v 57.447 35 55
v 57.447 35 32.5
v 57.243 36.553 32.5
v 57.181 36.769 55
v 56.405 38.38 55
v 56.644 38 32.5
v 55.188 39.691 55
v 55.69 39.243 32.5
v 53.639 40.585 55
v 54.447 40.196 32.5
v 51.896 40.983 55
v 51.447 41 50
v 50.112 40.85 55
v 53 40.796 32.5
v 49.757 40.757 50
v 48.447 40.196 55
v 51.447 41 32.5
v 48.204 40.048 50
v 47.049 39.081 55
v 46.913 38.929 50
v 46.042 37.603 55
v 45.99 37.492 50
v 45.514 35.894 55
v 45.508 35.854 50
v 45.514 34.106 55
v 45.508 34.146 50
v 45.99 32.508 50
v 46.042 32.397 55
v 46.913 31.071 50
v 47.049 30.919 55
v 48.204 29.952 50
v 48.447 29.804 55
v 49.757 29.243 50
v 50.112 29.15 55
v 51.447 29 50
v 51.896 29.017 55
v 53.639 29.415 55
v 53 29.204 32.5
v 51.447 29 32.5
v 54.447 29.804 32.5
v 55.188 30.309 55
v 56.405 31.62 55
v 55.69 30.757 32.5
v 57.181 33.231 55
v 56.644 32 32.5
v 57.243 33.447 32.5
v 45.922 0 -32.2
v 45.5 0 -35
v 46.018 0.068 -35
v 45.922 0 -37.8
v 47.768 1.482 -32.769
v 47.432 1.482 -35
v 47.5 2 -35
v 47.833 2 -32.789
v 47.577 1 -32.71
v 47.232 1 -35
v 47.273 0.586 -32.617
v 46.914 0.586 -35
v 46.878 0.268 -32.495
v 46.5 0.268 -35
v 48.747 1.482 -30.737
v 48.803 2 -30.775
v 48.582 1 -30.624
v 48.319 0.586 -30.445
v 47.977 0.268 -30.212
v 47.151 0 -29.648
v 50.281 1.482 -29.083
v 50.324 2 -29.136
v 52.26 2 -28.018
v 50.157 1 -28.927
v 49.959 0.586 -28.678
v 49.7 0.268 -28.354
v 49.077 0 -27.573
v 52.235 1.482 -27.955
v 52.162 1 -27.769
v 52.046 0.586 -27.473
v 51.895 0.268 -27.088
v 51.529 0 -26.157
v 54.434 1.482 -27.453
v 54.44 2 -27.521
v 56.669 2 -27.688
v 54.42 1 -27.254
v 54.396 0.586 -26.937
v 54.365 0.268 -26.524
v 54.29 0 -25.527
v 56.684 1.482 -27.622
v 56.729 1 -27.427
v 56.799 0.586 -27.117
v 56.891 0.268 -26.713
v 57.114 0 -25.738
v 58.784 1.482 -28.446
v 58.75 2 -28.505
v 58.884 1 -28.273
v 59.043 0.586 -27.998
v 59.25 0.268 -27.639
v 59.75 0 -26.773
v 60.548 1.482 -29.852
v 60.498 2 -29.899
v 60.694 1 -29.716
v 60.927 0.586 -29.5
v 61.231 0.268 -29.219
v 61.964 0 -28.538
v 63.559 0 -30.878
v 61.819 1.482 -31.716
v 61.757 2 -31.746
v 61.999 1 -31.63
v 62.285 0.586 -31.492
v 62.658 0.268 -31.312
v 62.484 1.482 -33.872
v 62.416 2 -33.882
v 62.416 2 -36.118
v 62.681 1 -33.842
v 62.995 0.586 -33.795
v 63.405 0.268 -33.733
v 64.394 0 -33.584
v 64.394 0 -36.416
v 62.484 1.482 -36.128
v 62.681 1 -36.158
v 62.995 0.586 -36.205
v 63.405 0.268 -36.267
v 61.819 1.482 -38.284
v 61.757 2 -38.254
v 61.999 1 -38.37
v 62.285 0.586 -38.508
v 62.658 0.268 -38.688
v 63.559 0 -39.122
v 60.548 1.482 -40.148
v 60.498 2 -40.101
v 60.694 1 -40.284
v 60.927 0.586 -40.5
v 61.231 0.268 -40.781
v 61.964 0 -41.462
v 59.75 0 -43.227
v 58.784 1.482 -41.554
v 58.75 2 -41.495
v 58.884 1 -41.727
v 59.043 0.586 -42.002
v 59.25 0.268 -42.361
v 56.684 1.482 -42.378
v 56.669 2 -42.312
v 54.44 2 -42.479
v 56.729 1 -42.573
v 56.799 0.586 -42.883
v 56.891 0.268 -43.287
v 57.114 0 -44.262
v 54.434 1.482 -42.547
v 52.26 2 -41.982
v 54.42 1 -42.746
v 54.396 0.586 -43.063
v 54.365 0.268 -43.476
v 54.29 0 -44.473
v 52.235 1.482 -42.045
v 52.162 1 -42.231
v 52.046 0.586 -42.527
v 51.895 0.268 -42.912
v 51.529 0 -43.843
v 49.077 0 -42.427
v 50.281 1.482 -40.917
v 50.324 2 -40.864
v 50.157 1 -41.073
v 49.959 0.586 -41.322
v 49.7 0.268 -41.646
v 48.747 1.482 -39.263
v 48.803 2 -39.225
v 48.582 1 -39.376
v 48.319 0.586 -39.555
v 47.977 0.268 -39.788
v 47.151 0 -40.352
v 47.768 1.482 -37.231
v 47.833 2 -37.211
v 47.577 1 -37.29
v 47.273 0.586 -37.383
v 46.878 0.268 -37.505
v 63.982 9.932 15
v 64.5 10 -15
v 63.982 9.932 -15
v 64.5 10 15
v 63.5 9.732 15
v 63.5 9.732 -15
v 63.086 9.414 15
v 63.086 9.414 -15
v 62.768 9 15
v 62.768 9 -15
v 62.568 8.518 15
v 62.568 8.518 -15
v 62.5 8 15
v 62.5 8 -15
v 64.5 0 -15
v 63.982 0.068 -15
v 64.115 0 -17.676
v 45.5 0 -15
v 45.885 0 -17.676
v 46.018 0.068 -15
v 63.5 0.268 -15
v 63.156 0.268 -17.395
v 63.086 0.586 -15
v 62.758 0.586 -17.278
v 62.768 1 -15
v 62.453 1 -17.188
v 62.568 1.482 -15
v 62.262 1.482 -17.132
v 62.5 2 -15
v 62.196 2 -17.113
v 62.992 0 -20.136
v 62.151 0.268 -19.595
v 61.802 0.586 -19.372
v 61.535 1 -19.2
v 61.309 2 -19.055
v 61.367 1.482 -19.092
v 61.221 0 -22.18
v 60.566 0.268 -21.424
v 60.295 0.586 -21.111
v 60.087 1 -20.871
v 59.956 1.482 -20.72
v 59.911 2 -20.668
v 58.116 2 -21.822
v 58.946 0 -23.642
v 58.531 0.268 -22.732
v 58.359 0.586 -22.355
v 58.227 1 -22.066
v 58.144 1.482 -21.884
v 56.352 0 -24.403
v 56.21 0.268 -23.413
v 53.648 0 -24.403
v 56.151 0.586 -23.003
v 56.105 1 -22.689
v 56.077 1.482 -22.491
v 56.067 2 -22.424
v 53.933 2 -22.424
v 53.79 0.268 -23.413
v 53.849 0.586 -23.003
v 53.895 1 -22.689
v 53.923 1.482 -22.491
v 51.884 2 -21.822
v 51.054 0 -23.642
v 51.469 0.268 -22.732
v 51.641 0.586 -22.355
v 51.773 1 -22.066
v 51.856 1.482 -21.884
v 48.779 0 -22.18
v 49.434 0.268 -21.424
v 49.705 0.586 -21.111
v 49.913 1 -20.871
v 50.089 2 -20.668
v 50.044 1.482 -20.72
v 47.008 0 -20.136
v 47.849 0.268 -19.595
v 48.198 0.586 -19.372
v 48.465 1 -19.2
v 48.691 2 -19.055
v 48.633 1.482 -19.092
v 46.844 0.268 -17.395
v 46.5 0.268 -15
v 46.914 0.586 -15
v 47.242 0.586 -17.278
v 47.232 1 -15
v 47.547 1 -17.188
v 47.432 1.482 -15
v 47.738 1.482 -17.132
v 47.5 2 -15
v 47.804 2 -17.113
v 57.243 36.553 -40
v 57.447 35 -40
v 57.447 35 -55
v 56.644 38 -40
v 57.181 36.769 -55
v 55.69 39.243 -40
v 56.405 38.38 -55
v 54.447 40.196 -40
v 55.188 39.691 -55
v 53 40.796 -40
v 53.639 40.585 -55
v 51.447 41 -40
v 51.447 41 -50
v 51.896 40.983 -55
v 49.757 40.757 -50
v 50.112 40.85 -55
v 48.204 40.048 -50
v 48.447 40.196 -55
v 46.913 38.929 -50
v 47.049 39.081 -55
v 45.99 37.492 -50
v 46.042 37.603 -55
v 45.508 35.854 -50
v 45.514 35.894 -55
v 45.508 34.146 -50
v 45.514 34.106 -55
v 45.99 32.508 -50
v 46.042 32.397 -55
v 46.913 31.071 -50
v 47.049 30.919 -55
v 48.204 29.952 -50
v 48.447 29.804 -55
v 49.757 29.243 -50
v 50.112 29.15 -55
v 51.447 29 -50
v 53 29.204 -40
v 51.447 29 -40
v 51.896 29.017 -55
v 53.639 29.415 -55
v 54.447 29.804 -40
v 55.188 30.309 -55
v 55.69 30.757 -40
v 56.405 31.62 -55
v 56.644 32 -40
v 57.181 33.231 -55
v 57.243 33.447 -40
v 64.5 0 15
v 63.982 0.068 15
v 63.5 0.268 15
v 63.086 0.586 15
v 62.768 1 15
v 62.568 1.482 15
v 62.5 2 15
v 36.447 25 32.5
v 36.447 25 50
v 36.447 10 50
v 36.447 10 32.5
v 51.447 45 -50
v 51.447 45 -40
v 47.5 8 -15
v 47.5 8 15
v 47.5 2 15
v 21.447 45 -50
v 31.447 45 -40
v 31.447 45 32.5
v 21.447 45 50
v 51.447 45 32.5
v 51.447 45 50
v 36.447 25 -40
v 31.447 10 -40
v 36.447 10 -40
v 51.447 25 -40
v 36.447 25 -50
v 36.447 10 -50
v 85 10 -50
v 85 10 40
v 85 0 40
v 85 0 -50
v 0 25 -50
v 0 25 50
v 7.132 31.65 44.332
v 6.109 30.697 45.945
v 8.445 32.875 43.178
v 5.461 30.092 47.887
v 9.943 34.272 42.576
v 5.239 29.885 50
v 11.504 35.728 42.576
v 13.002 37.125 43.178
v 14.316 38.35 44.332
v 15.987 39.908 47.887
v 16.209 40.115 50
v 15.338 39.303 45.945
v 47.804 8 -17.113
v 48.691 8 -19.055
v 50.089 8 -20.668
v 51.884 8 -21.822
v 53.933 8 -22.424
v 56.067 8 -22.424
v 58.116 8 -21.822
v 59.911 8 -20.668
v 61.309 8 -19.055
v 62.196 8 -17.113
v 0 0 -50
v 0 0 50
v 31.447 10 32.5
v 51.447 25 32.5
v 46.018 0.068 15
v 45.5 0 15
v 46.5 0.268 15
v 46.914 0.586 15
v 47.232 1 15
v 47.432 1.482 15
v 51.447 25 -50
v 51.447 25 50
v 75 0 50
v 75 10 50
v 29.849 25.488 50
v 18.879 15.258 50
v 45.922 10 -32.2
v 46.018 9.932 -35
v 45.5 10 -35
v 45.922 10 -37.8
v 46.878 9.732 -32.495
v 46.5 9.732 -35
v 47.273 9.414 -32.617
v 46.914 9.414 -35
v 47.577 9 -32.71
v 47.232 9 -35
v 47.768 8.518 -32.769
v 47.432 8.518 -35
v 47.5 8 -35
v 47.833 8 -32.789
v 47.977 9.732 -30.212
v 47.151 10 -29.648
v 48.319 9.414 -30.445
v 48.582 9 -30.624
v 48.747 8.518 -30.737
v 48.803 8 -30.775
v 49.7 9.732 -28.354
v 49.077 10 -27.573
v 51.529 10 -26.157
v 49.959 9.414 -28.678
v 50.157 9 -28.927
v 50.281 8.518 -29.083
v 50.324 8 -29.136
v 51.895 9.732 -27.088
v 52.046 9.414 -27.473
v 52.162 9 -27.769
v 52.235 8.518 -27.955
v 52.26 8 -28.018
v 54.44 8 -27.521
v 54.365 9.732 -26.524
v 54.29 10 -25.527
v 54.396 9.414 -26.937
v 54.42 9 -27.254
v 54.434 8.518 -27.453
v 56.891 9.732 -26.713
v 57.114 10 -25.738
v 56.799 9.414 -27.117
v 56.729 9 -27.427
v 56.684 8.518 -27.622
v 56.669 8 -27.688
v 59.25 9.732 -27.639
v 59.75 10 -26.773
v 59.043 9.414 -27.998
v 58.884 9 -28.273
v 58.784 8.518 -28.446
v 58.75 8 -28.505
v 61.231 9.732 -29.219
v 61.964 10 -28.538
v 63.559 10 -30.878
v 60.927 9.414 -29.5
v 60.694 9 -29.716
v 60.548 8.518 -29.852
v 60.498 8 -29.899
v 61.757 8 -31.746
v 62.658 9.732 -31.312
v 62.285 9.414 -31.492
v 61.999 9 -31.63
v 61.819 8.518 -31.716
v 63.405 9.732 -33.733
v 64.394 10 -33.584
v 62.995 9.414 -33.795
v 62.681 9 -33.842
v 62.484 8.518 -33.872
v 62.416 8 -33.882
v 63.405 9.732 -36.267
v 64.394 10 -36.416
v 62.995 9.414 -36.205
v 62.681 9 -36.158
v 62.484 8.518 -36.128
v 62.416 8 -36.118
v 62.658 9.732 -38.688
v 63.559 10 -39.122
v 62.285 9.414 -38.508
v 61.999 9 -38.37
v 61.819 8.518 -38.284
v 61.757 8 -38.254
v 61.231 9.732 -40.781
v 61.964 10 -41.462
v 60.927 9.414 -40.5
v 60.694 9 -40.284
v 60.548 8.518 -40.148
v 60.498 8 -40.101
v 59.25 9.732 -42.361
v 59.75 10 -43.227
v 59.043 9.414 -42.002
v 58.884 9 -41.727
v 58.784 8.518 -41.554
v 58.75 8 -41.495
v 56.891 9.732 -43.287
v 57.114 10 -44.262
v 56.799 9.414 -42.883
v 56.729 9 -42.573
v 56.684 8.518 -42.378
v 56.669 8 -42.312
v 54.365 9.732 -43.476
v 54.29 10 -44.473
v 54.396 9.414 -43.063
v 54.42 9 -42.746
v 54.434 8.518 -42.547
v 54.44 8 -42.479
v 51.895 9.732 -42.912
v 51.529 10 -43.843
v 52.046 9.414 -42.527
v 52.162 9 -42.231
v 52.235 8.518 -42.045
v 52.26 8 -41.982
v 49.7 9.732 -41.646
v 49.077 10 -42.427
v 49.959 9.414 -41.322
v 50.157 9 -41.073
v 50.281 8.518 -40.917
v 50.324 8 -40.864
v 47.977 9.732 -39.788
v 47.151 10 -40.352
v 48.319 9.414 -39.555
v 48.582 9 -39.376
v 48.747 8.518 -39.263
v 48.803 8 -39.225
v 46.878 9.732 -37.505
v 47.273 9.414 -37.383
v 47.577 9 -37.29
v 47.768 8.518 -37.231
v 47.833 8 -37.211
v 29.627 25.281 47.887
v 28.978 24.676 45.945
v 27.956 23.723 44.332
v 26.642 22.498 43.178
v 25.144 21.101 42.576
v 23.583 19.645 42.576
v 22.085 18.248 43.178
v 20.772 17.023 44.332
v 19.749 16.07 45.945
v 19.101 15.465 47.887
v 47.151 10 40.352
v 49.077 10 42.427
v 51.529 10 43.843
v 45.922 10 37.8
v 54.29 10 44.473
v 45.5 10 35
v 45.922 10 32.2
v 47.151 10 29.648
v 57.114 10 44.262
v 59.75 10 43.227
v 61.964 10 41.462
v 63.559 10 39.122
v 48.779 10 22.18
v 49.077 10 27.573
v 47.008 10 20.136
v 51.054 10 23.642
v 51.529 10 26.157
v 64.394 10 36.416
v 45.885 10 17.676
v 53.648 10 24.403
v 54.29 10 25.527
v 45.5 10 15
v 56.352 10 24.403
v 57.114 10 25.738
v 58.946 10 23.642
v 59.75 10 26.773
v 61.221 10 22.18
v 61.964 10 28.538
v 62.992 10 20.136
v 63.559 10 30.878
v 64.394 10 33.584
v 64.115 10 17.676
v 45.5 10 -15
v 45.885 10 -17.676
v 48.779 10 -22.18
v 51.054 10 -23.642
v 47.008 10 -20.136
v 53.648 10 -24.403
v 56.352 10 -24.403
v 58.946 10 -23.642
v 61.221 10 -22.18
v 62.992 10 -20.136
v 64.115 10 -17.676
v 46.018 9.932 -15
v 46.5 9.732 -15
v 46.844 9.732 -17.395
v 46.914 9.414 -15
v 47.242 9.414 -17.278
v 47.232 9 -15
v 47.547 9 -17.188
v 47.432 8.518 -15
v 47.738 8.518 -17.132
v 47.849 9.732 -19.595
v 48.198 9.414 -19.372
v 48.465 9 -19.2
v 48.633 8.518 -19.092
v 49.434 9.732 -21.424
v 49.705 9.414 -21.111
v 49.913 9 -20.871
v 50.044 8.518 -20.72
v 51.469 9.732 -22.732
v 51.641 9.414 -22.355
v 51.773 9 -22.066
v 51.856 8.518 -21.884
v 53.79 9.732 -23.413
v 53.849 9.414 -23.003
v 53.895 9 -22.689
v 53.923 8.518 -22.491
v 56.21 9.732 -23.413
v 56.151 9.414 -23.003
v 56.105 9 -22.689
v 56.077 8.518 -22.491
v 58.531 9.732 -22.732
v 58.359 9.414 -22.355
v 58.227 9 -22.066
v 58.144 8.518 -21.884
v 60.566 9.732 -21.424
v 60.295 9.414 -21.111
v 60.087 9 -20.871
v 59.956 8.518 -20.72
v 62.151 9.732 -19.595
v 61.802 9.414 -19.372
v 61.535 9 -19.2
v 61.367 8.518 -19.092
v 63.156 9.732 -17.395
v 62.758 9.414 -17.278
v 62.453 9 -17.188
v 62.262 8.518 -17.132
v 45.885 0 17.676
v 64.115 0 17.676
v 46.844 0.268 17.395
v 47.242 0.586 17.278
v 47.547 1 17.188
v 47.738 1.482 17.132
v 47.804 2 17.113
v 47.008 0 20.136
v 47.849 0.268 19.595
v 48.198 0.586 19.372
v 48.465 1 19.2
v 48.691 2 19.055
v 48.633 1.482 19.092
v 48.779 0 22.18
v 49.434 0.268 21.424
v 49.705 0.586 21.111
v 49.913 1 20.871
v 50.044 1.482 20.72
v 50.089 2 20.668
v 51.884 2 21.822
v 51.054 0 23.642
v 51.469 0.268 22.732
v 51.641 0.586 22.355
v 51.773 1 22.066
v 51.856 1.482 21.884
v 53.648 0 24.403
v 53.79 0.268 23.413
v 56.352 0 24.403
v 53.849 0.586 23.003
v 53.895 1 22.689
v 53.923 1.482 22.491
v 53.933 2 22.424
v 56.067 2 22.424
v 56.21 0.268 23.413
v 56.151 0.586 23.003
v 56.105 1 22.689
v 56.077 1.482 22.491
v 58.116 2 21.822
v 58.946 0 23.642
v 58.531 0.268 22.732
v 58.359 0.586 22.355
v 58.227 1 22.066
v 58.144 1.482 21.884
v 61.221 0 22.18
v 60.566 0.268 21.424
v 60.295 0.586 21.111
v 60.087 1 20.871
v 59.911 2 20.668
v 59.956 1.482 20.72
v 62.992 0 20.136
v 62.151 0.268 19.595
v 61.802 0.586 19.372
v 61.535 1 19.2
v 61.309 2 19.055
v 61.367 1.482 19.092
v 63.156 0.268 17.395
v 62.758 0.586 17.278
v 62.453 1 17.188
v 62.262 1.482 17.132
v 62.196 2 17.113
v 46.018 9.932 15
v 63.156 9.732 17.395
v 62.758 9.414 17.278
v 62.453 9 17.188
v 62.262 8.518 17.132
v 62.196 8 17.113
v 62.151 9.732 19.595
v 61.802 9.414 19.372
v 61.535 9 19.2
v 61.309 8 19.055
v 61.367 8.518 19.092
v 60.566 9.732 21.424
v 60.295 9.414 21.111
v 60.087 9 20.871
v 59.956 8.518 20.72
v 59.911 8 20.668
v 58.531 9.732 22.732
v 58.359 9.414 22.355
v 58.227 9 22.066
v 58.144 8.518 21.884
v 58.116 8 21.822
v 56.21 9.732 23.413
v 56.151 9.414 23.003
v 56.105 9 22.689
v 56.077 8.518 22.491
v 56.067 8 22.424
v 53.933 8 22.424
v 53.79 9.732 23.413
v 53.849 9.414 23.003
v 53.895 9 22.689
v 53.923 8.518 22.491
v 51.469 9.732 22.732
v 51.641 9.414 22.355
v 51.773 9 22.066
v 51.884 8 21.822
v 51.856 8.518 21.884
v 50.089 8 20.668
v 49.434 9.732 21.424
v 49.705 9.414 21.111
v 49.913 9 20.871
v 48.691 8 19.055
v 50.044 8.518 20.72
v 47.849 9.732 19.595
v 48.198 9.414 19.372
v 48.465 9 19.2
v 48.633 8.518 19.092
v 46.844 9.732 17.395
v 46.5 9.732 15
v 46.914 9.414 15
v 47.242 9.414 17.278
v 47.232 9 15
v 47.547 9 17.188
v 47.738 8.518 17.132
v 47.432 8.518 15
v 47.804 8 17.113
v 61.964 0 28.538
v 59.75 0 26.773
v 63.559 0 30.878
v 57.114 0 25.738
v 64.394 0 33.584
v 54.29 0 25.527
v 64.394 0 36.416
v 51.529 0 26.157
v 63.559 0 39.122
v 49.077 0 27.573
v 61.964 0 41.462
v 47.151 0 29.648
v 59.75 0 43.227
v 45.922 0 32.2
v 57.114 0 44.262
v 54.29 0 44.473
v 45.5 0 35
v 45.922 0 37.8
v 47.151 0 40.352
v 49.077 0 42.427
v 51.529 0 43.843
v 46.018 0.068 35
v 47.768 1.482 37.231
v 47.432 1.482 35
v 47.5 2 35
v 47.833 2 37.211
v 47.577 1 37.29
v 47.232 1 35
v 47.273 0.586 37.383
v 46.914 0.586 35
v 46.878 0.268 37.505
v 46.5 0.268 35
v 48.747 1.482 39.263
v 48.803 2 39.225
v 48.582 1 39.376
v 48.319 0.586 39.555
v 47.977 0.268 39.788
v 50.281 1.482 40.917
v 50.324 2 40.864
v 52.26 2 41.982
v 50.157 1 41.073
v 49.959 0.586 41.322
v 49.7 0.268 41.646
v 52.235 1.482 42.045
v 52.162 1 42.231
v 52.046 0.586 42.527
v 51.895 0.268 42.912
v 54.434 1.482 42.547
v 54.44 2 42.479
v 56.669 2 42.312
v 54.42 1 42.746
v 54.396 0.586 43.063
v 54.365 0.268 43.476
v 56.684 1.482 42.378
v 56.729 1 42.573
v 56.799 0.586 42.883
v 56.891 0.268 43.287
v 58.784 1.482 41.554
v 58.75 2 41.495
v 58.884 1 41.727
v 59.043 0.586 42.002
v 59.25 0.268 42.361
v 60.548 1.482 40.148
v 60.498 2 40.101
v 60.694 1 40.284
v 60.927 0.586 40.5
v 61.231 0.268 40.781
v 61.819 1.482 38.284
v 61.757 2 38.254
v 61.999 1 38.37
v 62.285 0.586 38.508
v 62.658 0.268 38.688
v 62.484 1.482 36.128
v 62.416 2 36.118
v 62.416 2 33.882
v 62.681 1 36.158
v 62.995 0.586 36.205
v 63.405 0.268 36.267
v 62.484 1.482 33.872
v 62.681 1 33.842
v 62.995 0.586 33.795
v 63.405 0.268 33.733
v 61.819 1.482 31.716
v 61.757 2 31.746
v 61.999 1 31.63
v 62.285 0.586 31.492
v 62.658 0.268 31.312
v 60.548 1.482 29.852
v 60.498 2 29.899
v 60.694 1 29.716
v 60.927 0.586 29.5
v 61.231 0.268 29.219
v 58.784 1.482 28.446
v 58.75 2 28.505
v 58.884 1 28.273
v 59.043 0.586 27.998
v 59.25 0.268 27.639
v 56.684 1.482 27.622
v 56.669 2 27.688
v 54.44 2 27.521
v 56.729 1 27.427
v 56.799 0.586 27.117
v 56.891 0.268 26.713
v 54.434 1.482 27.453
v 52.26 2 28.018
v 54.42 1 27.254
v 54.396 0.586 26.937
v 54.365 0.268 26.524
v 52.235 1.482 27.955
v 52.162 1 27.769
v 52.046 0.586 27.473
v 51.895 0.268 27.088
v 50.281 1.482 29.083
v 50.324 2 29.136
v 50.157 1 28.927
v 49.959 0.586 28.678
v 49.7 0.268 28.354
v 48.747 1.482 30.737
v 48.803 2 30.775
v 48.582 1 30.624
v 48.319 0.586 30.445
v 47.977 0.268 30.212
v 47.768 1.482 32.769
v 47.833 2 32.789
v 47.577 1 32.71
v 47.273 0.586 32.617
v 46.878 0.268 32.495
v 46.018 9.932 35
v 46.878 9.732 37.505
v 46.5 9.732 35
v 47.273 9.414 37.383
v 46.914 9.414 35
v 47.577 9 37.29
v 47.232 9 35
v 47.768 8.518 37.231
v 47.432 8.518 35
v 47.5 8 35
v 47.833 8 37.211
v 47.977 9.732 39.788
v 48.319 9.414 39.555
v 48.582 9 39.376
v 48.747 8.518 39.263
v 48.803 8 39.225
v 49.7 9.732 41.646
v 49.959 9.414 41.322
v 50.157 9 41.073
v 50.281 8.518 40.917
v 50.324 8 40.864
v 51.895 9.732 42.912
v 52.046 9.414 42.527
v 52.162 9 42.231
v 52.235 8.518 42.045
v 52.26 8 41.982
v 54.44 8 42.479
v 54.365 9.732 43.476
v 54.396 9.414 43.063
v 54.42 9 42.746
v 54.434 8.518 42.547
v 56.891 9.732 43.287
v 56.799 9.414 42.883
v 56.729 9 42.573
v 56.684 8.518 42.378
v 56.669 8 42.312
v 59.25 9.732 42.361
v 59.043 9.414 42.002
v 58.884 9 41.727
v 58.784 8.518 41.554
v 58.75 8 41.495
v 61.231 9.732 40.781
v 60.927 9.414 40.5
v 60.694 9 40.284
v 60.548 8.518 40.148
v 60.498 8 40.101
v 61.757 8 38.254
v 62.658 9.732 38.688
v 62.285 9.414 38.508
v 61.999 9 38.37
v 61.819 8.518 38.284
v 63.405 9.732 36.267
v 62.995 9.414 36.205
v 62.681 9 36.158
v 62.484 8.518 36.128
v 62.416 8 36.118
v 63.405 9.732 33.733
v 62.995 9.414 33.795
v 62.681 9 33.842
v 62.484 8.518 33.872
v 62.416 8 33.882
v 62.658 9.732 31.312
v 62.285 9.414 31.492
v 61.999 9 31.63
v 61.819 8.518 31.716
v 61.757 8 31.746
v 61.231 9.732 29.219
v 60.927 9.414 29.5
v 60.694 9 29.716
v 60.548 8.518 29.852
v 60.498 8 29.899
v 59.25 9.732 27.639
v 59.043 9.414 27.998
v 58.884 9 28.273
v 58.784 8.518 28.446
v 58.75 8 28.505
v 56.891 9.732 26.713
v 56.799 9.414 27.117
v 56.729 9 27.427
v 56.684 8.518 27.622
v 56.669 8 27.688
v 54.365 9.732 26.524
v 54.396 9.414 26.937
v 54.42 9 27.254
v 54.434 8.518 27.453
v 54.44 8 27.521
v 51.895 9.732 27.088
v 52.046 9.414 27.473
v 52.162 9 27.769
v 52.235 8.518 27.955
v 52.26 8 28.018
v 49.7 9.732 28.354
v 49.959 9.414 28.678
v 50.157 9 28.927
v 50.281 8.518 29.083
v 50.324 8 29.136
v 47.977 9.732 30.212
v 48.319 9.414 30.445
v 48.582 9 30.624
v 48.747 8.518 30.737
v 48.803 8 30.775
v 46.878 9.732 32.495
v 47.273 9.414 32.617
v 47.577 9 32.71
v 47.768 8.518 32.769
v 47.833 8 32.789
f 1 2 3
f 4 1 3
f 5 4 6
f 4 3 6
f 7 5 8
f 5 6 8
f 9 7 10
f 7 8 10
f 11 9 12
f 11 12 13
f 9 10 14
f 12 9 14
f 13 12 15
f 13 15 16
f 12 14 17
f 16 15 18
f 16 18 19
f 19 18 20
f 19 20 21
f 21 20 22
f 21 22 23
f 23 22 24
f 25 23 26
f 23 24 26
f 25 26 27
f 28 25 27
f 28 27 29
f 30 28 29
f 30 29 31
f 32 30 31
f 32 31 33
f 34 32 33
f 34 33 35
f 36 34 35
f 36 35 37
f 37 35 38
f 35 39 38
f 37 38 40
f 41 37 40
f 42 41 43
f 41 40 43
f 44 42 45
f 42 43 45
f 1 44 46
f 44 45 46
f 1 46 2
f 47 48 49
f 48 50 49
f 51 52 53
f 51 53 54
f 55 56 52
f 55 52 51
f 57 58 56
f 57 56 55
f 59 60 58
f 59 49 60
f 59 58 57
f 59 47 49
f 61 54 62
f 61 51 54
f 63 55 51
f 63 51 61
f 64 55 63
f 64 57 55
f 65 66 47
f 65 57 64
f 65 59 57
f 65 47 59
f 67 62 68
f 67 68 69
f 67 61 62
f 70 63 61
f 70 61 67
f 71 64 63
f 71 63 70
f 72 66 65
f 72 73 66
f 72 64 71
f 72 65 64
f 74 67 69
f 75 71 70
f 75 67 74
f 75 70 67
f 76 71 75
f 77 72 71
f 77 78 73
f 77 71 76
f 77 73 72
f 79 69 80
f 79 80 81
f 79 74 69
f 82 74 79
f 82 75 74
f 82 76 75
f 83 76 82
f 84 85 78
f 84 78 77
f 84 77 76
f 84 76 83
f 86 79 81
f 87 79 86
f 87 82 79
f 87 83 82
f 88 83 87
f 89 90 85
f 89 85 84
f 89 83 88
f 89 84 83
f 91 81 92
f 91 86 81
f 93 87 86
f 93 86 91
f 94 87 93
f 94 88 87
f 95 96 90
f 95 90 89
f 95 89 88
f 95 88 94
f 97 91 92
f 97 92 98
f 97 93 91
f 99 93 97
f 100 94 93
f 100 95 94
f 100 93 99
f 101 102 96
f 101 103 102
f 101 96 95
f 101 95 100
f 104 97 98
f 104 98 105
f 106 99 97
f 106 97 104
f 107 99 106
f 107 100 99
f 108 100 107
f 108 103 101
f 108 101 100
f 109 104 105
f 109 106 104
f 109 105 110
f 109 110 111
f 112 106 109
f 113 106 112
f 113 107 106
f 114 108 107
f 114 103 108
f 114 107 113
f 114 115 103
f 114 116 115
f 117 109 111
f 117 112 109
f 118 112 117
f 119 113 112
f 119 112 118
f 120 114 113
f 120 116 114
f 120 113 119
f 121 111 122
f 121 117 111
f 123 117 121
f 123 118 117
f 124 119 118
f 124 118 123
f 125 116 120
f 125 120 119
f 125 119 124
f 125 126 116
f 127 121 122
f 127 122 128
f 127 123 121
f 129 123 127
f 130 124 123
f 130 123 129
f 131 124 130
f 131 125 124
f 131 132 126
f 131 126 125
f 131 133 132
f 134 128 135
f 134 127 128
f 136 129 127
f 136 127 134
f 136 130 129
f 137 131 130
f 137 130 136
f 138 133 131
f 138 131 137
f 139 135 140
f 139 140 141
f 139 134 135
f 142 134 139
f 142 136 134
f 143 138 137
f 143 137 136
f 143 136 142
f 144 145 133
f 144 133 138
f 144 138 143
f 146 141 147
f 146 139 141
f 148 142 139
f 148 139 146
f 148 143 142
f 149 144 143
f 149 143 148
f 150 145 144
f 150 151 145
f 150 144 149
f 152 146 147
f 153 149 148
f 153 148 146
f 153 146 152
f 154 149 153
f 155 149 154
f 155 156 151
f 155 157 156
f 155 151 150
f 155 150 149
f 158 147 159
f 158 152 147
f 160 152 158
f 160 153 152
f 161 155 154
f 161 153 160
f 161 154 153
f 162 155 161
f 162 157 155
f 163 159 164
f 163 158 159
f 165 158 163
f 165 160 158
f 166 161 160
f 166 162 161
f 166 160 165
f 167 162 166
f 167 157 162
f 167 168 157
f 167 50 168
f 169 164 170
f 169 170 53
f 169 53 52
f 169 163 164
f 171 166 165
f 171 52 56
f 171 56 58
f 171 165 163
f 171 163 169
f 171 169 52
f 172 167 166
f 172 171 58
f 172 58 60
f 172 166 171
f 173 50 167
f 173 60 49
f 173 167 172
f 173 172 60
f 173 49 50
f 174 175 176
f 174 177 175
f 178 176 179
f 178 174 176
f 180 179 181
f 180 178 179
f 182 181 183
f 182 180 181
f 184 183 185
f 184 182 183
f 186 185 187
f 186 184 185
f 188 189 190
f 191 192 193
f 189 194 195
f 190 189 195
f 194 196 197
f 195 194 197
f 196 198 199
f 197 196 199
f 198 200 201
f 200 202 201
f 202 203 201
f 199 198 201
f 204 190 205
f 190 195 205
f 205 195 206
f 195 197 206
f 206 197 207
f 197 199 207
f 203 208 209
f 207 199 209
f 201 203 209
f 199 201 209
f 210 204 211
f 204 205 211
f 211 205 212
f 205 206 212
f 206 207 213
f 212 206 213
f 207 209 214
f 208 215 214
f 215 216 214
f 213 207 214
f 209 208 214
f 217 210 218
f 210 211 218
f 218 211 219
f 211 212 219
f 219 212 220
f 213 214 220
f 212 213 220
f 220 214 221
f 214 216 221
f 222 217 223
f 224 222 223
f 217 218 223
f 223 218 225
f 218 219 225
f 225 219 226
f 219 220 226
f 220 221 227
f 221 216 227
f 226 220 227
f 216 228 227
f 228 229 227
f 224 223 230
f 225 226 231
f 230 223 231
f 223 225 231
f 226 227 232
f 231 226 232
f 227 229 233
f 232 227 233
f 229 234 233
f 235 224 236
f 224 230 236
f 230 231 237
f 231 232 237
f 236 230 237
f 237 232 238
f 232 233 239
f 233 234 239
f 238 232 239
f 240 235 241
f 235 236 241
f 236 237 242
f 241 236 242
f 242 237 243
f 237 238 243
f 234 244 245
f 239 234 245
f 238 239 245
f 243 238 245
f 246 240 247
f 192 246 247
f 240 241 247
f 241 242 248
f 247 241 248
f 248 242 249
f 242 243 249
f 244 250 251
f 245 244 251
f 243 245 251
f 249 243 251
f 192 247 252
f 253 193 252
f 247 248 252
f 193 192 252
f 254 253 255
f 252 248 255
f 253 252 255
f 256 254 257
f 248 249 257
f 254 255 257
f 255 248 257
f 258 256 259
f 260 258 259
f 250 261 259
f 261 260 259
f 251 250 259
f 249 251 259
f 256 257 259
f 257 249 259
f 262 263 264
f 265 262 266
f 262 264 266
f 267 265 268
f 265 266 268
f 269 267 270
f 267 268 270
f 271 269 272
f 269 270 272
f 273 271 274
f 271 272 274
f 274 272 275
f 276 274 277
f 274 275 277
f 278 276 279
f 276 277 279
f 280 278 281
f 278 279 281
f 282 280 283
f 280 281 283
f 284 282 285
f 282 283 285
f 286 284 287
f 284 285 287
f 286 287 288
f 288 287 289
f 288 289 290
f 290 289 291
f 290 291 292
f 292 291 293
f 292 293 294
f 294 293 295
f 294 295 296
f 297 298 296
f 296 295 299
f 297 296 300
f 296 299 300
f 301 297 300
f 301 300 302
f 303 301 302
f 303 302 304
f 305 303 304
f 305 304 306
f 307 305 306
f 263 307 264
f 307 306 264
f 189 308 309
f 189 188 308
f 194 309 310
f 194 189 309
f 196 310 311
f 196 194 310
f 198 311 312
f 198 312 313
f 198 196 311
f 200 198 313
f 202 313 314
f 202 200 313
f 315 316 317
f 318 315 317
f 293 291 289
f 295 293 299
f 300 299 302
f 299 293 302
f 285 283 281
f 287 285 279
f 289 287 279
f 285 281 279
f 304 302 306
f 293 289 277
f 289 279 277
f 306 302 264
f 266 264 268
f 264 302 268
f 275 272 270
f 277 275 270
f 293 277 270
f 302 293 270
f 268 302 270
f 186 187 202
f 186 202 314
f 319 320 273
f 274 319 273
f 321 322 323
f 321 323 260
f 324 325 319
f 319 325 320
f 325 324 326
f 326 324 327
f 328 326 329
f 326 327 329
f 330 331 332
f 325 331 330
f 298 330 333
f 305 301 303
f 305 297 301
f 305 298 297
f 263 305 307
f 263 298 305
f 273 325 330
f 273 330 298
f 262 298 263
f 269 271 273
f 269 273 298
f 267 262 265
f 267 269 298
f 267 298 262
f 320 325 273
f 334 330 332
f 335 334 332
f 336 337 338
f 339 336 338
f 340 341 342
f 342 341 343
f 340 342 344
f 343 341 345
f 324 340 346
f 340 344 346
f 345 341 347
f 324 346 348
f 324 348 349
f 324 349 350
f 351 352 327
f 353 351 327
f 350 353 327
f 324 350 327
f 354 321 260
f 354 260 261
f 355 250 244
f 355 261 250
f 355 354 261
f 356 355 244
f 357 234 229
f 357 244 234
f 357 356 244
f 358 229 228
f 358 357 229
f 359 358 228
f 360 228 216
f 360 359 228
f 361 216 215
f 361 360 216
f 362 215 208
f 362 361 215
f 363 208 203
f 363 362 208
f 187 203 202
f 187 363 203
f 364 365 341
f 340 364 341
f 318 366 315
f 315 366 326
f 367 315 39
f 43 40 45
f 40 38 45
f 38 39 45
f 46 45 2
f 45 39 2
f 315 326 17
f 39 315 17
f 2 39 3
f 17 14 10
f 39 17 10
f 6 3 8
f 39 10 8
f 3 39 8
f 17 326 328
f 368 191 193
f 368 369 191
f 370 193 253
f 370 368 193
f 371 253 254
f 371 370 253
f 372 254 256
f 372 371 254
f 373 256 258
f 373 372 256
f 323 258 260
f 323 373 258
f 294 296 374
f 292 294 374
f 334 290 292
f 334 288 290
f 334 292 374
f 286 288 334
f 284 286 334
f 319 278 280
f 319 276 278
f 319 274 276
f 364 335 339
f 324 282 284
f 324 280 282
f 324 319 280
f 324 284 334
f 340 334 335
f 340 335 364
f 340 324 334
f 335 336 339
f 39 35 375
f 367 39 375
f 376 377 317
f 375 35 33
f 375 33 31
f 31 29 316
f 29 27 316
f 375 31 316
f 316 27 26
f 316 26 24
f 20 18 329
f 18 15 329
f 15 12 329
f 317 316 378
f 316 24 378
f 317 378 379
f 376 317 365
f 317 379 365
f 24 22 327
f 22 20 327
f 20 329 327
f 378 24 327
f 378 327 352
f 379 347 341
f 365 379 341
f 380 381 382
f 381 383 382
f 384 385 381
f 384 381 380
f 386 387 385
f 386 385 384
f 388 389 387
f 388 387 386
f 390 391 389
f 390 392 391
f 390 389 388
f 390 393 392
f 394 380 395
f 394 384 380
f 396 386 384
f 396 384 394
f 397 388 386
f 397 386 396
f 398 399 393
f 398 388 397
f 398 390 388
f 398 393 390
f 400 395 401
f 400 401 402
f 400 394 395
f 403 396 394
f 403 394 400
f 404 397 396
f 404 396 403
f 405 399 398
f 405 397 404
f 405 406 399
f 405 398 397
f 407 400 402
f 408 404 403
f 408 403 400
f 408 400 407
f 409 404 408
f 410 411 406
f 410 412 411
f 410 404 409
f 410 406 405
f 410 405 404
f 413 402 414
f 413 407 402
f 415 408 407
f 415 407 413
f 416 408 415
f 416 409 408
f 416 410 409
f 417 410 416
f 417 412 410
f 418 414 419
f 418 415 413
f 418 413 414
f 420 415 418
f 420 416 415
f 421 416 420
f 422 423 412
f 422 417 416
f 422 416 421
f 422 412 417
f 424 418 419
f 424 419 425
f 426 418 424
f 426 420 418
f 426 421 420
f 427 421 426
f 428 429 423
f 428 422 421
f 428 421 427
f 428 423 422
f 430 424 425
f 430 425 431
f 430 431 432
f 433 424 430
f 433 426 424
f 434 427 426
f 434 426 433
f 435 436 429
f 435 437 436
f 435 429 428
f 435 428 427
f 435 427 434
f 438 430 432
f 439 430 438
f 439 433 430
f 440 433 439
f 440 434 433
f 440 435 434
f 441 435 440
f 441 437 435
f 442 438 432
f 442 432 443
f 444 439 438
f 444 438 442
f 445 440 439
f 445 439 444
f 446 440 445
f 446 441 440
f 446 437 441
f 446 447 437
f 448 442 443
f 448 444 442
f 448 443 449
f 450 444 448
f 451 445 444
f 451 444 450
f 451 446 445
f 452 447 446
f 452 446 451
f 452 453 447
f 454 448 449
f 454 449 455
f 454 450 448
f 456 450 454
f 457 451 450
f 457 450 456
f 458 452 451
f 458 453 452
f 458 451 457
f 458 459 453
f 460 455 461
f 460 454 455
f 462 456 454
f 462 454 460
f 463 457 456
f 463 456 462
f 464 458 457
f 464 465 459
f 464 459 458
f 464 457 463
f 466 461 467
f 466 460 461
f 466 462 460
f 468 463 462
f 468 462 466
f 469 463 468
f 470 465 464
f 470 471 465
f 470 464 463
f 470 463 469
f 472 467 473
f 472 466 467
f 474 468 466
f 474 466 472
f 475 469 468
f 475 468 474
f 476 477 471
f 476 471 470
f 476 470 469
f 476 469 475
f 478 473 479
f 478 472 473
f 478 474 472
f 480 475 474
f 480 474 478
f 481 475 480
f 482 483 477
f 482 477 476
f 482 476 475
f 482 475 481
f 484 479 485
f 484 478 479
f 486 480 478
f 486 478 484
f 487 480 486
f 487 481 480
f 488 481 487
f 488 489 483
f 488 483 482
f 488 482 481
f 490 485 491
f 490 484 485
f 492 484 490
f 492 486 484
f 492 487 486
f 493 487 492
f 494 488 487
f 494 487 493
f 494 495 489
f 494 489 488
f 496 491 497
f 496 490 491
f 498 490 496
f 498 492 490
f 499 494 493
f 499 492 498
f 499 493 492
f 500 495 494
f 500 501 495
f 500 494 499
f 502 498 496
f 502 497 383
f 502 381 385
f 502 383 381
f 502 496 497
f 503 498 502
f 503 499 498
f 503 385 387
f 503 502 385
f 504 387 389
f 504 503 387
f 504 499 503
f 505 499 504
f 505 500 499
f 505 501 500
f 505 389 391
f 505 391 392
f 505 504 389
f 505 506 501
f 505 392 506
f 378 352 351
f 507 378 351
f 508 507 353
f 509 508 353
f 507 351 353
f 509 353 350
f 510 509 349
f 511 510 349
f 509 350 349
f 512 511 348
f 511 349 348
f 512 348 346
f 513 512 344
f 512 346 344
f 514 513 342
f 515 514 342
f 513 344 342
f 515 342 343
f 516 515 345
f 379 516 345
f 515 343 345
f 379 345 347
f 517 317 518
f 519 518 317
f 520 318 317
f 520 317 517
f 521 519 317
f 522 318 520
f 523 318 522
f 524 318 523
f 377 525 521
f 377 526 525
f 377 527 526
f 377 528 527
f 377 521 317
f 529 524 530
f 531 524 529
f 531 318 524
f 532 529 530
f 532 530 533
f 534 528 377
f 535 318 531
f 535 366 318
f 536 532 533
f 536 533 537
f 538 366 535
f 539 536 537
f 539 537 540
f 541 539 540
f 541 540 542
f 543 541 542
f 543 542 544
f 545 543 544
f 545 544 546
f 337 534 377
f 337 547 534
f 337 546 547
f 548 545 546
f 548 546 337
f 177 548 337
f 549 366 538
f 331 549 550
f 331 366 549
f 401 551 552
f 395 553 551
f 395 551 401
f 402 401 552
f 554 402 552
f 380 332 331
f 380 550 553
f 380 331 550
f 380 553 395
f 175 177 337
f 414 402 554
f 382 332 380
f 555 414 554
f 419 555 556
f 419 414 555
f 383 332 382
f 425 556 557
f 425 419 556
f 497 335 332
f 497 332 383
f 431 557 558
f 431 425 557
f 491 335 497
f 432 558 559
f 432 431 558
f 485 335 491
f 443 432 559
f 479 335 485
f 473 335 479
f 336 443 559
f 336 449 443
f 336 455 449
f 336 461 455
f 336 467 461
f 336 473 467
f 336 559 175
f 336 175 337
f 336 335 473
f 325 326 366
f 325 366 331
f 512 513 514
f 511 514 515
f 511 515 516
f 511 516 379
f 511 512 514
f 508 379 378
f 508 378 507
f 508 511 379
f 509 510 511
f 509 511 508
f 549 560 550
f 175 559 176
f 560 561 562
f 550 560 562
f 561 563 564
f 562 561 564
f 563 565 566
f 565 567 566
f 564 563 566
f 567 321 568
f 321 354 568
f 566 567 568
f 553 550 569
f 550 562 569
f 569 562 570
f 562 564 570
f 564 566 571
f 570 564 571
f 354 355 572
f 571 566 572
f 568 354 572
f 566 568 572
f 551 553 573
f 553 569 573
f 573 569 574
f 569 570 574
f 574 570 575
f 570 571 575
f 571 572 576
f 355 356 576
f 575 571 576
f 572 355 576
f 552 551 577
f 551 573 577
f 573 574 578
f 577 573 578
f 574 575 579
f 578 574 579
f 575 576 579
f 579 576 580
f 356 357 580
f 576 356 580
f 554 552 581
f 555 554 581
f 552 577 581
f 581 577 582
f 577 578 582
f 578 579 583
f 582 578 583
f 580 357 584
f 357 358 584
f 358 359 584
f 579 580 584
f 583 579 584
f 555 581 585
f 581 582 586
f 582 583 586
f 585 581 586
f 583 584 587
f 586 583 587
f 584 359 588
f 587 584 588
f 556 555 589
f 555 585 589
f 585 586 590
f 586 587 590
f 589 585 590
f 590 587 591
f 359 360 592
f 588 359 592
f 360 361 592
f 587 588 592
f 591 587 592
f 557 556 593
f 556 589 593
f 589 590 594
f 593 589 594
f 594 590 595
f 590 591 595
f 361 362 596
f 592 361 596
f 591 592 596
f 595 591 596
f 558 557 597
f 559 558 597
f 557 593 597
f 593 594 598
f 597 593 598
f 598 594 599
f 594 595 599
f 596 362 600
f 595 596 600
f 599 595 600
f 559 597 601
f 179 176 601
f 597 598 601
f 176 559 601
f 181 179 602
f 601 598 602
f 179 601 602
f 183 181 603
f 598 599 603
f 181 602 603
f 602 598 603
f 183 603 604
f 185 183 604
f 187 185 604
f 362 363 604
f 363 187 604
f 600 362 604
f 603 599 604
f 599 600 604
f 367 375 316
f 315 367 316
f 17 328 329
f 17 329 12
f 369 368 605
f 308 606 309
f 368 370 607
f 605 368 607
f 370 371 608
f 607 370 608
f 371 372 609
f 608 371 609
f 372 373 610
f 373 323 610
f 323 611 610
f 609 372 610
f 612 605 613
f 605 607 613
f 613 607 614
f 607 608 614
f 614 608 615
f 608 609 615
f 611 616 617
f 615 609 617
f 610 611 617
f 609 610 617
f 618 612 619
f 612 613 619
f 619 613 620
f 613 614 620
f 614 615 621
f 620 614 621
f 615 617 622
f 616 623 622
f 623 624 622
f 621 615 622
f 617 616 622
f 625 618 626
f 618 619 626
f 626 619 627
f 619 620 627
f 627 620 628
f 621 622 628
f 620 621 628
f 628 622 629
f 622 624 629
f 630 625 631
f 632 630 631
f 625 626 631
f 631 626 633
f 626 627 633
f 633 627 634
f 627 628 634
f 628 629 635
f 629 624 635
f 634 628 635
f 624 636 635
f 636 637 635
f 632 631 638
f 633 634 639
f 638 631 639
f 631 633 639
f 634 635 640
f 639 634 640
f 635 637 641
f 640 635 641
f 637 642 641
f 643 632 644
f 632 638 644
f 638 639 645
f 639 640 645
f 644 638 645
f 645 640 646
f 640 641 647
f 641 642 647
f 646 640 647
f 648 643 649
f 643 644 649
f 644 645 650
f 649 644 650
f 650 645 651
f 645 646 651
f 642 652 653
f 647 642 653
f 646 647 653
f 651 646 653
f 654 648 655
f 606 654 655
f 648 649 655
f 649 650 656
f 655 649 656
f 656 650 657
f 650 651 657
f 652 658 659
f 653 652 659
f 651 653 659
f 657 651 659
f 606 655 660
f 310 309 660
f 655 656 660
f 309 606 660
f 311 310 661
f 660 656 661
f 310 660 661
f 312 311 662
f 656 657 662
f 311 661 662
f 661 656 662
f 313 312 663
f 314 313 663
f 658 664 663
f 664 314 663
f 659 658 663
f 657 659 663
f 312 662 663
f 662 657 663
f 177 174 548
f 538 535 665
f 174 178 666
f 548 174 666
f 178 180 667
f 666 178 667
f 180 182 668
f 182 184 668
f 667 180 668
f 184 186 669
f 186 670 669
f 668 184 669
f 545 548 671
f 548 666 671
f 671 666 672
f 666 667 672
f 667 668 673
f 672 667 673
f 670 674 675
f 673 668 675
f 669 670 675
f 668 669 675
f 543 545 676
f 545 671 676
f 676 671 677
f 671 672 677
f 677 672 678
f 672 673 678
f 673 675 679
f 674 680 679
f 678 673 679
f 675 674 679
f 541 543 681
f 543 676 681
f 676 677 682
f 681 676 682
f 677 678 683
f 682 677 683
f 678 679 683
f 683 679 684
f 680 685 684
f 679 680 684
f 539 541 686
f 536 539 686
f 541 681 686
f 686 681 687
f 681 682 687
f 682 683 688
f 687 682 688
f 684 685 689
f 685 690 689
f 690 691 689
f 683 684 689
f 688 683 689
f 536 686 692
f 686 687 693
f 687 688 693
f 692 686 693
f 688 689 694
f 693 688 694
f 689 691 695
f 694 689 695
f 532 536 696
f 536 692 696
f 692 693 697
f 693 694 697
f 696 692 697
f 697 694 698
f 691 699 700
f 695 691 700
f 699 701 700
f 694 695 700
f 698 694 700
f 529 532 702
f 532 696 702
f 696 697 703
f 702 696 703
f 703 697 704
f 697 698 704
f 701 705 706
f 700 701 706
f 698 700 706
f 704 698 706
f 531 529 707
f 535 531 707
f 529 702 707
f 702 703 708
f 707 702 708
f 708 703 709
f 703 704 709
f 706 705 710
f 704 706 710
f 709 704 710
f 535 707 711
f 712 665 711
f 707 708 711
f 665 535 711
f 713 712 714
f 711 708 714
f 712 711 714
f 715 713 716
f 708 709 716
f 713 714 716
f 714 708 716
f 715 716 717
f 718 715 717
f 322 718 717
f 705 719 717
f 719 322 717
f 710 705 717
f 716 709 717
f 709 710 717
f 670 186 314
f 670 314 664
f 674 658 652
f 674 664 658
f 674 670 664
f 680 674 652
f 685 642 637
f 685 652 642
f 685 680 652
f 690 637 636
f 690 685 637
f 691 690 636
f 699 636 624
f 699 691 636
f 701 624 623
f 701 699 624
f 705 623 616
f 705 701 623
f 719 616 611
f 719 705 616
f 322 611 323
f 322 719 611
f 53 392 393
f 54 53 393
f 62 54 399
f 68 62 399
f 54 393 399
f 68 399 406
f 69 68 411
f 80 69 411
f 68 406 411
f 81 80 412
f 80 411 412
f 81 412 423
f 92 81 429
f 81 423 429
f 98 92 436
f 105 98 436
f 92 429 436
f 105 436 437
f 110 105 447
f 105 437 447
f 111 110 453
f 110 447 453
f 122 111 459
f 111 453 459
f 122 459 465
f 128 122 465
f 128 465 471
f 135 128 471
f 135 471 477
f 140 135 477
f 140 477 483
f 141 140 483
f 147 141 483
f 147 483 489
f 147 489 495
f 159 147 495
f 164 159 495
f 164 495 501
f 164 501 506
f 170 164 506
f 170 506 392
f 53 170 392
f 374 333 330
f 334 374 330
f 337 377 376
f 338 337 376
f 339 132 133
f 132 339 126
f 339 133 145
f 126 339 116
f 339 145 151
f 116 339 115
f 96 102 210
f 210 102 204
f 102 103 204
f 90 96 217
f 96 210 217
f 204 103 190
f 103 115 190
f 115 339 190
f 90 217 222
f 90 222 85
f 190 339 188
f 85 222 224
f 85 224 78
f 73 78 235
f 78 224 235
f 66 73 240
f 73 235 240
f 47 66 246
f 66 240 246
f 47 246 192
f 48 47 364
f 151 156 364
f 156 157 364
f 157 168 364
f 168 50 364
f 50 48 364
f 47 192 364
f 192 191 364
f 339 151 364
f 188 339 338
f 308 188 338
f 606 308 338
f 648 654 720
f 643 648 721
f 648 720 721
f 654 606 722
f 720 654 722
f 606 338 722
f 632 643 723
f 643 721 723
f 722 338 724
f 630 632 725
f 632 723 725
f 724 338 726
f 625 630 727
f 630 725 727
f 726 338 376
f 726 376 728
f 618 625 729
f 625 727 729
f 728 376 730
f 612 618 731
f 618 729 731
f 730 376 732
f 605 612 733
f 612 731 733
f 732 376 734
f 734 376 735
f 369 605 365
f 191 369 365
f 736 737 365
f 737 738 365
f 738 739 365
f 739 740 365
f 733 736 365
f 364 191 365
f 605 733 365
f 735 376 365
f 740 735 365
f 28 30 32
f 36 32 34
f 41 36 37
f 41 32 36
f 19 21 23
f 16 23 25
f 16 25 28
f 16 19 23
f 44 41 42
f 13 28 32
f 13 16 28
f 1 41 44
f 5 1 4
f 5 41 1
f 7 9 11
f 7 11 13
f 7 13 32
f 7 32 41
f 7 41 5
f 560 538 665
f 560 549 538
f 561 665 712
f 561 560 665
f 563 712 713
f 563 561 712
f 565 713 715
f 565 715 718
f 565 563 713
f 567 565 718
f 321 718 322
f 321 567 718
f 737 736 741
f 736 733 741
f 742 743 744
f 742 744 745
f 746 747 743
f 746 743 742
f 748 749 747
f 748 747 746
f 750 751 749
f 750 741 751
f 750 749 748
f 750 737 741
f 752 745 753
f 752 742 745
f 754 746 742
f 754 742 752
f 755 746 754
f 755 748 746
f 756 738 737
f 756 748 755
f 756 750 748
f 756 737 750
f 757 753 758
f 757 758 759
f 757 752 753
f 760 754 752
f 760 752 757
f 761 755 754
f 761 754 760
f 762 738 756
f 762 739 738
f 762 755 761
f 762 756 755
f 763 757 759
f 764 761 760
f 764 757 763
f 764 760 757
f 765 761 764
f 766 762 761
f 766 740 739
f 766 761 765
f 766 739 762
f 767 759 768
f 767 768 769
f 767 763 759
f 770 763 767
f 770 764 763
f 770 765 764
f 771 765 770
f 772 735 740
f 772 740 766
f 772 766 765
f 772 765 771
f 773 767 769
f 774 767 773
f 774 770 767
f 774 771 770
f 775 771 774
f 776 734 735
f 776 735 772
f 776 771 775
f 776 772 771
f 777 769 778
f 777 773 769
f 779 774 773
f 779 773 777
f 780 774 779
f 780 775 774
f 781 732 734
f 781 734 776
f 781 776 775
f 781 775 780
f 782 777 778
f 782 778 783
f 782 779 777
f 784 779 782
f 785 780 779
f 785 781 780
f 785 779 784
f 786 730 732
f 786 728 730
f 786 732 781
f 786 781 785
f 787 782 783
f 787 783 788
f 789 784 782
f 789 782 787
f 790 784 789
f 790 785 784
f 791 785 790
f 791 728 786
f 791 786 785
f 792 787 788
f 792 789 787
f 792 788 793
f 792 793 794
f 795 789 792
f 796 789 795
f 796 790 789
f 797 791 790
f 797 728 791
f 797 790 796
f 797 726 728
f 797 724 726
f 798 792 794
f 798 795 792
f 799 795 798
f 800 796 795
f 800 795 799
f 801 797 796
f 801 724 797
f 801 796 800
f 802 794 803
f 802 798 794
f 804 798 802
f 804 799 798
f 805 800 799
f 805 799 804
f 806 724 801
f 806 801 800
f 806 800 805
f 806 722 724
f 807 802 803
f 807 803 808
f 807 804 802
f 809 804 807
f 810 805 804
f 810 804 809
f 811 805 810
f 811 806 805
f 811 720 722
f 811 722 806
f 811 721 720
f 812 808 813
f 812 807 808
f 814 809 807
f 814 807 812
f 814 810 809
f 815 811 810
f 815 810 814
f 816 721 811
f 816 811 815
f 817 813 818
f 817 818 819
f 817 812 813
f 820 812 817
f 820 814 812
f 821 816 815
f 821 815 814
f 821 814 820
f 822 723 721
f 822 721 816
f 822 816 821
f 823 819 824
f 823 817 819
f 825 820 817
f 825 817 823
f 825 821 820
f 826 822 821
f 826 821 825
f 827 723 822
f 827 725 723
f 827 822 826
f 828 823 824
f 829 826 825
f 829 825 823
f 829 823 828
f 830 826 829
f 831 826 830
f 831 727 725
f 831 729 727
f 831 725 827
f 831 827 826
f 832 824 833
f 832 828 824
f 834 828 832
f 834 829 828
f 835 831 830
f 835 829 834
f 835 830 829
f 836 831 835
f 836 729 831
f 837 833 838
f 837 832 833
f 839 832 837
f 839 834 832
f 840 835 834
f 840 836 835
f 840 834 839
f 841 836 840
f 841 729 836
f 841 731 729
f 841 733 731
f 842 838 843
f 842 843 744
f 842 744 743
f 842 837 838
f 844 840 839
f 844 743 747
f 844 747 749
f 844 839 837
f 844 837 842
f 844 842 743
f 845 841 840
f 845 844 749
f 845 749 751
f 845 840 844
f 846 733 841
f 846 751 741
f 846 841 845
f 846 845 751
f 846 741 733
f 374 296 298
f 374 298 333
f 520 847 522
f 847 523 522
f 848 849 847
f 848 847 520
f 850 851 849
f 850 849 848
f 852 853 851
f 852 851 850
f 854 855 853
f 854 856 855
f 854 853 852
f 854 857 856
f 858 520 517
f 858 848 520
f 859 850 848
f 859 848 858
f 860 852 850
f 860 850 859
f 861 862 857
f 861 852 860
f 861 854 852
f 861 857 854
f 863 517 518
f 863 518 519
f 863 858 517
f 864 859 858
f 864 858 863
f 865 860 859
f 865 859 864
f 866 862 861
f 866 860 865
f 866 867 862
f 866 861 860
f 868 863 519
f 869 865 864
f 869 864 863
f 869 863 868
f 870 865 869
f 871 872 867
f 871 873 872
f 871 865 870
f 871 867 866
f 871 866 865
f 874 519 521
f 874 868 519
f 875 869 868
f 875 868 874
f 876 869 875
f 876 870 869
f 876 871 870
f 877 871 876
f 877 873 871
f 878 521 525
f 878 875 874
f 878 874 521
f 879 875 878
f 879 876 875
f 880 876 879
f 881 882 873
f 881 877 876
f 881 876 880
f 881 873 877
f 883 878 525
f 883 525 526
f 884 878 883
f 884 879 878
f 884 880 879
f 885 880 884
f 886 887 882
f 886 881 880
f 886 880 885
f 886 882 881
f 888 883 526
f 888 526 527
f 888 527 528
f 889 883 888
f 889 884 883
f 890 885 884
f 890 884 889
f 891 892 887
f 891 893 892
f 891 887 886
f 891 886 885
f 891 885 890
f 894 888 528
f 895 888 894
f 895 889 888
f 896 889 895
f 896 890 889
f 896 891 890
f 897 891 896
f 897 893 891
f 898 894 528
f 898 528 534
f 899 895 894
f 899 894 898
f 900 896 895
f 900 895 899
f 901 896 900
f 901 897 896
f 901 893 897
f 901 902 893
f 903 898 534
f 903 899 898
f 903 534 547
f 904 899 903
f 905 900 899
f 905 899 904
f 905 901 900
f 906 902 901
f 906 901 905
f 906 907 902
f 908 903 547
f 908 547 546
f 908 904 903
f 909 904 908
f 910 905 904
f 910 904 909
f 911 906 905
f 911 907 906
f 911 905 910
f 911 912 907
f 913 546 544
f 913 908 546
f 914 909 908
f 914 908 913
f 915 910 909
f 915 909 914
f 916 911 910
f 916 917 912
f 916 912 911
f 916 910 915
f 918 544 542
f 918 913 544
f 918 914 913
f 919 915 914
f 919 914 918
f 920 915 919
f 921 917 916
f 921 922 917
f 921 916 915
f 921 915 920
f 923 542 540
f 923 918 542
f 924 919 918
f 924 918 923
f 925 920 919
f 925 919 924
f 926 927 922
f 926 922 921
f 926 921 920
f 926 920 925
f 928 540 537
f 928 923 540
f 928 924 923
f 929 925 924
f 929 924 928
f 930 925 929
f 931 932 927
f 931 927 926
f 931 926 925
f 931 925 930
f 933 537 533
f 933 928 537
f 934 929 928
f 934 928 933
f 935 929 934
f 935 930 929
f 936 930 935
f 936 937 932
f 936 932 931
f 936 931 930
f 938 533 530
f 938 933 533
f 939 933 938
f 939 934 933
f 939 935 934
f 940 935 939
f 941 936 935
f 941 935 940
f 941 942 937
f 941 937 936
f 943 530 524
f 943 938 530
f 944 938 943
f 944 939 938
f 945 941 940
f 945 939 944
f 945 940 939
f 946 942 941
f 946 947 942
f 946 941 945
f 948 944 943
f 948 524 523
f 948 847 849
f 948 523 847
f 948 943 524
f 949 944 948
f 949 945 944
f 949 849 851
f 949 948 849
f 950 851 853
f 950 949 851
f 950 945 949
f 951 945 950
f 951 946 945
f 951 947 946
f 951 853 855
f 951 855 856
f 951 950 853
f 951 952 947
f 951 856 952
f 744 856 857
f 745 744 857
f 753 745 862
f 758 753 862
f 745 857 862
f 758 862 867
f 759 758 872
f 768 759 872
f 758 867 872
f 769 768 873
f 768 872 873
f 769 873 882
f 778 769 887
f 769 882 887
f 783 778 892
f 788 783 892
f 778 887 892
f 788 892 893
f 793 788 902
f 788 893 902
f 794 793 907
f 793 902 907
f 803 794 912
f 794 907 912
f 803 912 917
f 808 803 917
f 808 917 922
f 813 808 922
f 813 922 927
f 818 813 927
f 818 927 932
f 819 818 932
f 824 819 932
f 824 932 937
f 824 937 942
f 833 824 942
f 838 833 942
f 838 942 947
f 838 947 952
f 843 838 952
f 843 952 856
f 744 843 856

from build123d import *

# Parameters (mm, degrees)
BOSS_EXTRU_1_DEPTH      = 50
BOSS_EXTRU_2_DEPTH      = 55
BOSS_EXTRU_2_DEPTH_BACK = 55
ESQUISSE3_R             = 6
ESQUISSE4_W             = 26
ESQUISSE4_H             = 72.5
ENL_V_MAT_EXTRU_1_DEPTH = 35
ESQUISSE5_R             = 7.5
ENL_V_MAT_EXTRU_2_DEPTH = 20
ESQUISSE8_R             = 7.5
ENL_V_MAT_EXTRU_3_DEPTH = 108.121426428
CONG_1_R                = 2
CONG_2_R                = 2
CHANFREIN3_SIZE         = 10


with BuildPart() as part:
    # Esquisse1 → Boss.-Extru.1 (new, symmetric)
    with BuildSketch(Plane.XY):
        Polygon((0, 0), (0, 25), (21.4473742, 45), (51.4473742, 45), (51.4473742, 25), (36.4473742, 25), (36.4473742, 10), (85, 10), (85, 0), align=None)
    extrude(amount=BOSS_EXTRU_1_DEPTH, both=True)

    # Esquisse3 → Boss.-Extru.2 (add, two sides: drawn at the far end of the back side and taken through both)
    with BuildSketch(Plane.XY.offset(-BOSS_EXTRU_2_DEPTH_BACK)):
        with Locations((51.4473742, 35)):
            Circle(ESQUISSE3_R)
    extrude(amount=BOSS_EXTRU_2_DEPTH + BOSS_EXTRU_2_DEPTH_BACK)

    # Esquisse4 → Enlèv. mat.-Extru.1 (cut)
    with BuildSketch(Plane(origin=(0, 45, 0), x_dir=(1, 0, 0), z_dir=(0, 1, 0))):
        with Locations((44.4473742, 3.75)):
            Rectangle(ESQUISSE4_W, ESQUISSE4_H)
    extrude(amount=-ENL_V_MAT_EXTRU_1_DEPTH, mode=Mode.SUBTRACT)

    # Esquisse5 → Enlèv. mat.-Extru.2 (cut)
    with BuildSketch(Plane(origin=(-12.469550628, 13.371955922, 0), x_dir=(0.7313537016191717, 0.6819983600624974, 0), z_dir=(-0.6819983600624974, 0.7313537016191717, 0))):
        with Locations((31.712750858, -50)):
            Circle(ESQUISSE5_R)
    extrude(amount=-ENL_V_MAT_EXTRU_2_DEPTH, mode=Mode.SUBTRACT)

    # Esquisse8 → Enlèv. mat.-Extru.3 (cut, through all)
    with BuildSketch(Plane(origin=(0, 10, 0), x_dir=(1, 0, 0), z_dir=(0, 1, 0))):
        with Locations(Location((55, -35, 0), (0, 0, 180))):
            Circle(ESQUISSE8_R)
        with Locations(Location((55, 35, 0), (0, 0, 180))):
            Circle(ESQUISSE8_R)
        with BuildLine():
            Line((62.5, 15), (62.5, -15))
            ThreePointArc((62.5, -15), (55, -22.5), (47.5, -15))
            Line((47.5, -15), (47.5, 15))
            ThreePointArc((47.5, 15), (55, 22.5), (62.5, 15))
        make_face()
    extrude(amount=-ENL_V_MAT_EXTRU_3_DEPTH, mode=Mode.SUBTRACT)

    # Congé1
    cong_1_edges = [part.edges().sort_by_distance(p)[0] for p in [
        (55, 0, -22.5),
        (62.5, 0, 0),
        (55, 0, 22.5),
        (47.5, 0, 0),
        (55, 10, -22.5),
        (47.5, 10, 0),
        (55, 10, 22.5),
        (62.5, 10, 0),
    ]]
    fillet(cong_1_edges, radius=CONG_1_R)

    # Congé2
    cong_2_edges = [part.edges().sort_by_distance(p)[0] for p in [
        (62.5, 0, -35),
        (62.5, 10, -35),
        (62.5, 0, 35),
        (62.5, 10, 35),
    ]]
    fillet(cong_2_edges, radius=CONG_2_R)

    # Chanfrein3
    chanfrein3_edges = [part.edges().sort_by_distance(p)[0] for p in [
        (85, 5, 50),
    ]]
    chamfer(chanfrein3_edges, length=CHANFREIN3_SIZE)


solid = part.part
